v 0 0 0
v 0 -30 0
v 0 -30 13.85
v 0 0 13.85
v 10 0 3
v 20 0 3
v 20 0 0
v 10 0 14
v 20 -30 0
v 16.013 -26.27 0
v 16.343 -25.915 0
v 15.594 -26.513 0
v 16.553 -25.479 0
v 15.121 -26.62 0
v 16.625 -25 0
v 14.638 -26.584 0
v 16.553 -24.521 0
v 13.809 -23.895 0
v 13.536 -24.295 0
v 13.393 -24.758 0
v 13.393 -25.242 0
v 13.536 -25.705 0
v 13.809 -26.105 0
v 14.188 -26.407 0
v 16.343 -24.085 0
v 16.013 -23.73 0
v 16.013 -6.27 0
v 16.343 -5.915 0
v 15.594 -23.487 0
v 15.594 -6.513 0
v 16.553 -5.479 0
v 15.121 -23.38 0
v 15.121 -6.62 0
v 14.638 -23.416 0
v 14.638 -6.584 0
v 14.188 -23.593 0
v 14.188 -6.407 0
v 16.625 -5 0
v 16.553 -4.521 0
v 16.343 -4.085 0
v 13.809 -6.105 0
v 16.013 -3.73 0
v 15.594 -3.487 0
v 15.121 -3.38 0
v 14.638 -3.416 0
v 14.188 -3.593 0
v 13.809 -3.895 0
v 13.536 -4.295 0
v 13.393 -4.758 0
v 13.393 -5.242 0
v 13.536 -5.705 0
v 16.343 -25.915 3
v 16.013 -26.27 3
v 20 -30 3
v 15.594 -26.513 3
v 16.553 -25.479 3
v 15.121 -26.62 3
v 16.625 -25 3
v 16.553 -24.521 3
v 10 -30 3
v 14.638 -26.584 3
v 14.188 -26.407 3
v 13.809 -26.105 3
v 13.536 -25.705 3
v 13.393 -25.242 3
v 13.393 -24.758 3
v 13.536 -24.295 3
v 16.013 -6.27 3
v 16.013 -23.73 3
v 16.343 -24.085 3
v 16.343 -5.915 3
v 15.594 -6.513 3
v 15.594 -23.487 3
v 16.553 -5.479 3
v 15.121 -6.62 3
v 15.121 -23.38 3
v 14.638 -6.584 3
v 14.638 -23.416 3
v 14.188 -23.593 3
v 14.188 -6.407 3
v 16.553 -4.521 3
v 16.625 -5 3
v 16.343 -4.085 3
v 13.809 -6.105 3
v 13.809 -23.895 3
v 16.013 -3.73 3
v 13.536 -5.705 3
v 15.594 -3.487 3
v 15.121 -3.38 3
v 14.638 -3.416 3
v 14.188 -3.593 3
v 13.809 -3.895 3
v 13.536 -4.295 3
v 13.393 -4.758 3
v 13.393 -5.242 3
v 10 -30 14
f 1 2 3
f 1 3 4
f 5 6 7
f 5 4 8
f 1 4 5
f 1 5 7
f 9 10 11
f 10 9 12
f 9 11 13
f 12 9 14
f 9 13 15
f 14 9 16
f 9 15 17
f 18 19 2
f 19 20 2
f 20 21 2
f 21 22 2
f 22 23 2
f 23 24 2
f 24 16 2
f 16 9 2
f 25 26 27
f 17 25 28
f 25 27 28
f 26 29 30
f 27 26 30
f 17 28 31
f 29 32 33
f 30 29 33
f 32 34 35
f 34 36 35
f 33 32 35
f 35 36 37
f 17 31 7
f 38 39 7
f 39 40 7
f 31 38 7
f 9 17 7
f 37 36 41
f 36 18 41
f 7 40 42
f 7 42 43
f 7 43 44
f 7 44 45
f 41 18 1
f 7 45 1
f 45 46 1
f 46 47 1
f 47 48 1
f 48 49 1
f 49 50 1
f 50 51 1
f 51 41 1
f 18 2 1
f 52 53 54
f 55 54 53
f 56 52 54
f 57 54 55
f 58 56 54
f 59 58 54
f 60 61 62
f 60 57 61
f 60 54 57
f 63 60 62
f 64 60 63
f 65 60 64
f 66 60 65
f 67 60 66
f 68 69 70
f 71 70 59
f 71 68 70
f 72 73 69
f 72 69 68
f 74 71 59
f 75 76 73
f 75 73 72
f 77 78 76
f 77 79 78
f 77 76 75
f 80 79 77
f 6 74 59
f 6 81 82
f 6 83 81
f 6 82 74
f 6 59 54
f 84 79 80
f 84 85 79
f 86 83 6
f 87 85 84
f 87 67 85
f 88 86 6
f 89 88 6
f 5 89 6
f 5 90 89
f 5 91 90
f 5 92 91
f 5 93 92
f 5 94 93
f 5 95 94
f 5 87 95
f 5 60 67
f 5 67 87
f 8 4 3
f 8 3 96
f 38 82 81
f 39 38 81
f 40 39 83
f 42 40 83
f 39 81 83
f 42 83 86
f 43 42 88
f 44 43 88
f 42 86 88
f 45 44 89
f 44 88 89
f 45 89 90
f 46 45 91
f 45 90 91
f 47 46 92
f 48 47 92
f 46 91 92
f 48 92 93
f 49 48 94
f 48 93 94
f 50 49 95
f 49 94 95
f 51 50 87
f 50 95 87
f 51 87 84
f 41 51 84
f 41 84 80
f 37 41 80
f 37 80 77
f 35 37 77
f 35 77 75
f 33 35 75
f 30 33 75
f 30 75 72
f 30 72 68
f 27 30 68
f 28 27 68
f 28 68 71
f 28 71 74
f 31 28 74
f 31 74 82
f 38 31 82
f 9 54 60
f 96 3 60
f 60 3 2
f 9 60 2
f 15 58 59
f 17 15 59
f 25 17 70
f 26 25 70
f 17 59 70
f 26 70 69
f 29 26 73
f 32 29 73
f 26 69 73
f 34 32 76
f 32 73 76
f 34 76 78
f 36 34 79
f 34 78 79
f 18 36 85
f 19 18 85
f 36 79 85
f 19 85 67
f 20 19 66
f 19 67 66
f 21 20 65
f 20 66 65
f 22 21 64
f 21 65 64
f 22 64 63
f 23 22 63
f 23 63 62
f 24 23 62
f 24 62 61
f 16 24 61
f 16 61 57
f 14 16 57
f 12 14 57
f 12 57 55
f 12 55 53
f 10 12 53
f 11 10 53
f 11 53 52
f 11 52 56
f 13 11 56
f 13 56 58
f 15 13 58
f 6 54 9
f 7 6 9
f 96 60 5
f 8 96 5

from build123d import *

# Parameters (mm, degrees)
ESQUISSE1_W             = 10
ESQUISSE1_H             = 30
BOSS_EXTRU_1_DEPTH      = 14
ESQUISSE2_W             = 3
ESQUISSE2_H             = 30
BOSS_EXTRU_2_DEPTH      = 10
ESQUISSE3_R             = 1.625
ENL_V_MAT_EXTRU_1_DEPTH = 4
ENL_V_MAT_EXTRU_2_DEPTH = 31


with BuildPart() as part:
    # Esquisse1 → Boss.-Extru.1 (new body)
    with BuildSketch(Plane.XY):
        with Locations((5, -15)):
            Rectangle(ESQUISSE1_W, ESQUISSE1_H)
    extrude(amount=BOSS_EXTRU_1_DEPTH)

    # Esquisse2 → Boss.-Extru.2 (add)
    with BuildSketch(Plane(origin=(10, 0, 0), x_dir=(0, 0, -1), z_dir=(1, 0, 0))):
        with Locations((-1.5, -15)):
            Rectangle(ESQUISSE2_W, ESQUISSE2_H)
    extrude(amount=BOSS_EXTRU_2_DEPTH)

    # Esquisse3 → Enlèv. mat.-Extru.1 (cut, through all)
    with BuildSketch(Plane.XY.offset(3)):
        with Locations((15, -5)):
            Circle(ESQUISSE3_R)
        with Locations((15, -25)):
            Circle(ESQUISSE3_R)
    extrude(amount=-ENL_V_MAT_EXTRU_1_DEPTH, mode=Mode.SUBTRACT)

    # Esquisse4 → Enlèv. mat.-Extru.2 (cut, through all)
    with BuildSketch(Plane.XZ.offset(30)):
        Polygon((10, 14), (0, 14), (0, 13.85), align=None)
    extrude(amount=-ENL_V_MAT_EXTRU_2_DEPTH, mode=Mode.SUBTRACT)


solid = part.part
